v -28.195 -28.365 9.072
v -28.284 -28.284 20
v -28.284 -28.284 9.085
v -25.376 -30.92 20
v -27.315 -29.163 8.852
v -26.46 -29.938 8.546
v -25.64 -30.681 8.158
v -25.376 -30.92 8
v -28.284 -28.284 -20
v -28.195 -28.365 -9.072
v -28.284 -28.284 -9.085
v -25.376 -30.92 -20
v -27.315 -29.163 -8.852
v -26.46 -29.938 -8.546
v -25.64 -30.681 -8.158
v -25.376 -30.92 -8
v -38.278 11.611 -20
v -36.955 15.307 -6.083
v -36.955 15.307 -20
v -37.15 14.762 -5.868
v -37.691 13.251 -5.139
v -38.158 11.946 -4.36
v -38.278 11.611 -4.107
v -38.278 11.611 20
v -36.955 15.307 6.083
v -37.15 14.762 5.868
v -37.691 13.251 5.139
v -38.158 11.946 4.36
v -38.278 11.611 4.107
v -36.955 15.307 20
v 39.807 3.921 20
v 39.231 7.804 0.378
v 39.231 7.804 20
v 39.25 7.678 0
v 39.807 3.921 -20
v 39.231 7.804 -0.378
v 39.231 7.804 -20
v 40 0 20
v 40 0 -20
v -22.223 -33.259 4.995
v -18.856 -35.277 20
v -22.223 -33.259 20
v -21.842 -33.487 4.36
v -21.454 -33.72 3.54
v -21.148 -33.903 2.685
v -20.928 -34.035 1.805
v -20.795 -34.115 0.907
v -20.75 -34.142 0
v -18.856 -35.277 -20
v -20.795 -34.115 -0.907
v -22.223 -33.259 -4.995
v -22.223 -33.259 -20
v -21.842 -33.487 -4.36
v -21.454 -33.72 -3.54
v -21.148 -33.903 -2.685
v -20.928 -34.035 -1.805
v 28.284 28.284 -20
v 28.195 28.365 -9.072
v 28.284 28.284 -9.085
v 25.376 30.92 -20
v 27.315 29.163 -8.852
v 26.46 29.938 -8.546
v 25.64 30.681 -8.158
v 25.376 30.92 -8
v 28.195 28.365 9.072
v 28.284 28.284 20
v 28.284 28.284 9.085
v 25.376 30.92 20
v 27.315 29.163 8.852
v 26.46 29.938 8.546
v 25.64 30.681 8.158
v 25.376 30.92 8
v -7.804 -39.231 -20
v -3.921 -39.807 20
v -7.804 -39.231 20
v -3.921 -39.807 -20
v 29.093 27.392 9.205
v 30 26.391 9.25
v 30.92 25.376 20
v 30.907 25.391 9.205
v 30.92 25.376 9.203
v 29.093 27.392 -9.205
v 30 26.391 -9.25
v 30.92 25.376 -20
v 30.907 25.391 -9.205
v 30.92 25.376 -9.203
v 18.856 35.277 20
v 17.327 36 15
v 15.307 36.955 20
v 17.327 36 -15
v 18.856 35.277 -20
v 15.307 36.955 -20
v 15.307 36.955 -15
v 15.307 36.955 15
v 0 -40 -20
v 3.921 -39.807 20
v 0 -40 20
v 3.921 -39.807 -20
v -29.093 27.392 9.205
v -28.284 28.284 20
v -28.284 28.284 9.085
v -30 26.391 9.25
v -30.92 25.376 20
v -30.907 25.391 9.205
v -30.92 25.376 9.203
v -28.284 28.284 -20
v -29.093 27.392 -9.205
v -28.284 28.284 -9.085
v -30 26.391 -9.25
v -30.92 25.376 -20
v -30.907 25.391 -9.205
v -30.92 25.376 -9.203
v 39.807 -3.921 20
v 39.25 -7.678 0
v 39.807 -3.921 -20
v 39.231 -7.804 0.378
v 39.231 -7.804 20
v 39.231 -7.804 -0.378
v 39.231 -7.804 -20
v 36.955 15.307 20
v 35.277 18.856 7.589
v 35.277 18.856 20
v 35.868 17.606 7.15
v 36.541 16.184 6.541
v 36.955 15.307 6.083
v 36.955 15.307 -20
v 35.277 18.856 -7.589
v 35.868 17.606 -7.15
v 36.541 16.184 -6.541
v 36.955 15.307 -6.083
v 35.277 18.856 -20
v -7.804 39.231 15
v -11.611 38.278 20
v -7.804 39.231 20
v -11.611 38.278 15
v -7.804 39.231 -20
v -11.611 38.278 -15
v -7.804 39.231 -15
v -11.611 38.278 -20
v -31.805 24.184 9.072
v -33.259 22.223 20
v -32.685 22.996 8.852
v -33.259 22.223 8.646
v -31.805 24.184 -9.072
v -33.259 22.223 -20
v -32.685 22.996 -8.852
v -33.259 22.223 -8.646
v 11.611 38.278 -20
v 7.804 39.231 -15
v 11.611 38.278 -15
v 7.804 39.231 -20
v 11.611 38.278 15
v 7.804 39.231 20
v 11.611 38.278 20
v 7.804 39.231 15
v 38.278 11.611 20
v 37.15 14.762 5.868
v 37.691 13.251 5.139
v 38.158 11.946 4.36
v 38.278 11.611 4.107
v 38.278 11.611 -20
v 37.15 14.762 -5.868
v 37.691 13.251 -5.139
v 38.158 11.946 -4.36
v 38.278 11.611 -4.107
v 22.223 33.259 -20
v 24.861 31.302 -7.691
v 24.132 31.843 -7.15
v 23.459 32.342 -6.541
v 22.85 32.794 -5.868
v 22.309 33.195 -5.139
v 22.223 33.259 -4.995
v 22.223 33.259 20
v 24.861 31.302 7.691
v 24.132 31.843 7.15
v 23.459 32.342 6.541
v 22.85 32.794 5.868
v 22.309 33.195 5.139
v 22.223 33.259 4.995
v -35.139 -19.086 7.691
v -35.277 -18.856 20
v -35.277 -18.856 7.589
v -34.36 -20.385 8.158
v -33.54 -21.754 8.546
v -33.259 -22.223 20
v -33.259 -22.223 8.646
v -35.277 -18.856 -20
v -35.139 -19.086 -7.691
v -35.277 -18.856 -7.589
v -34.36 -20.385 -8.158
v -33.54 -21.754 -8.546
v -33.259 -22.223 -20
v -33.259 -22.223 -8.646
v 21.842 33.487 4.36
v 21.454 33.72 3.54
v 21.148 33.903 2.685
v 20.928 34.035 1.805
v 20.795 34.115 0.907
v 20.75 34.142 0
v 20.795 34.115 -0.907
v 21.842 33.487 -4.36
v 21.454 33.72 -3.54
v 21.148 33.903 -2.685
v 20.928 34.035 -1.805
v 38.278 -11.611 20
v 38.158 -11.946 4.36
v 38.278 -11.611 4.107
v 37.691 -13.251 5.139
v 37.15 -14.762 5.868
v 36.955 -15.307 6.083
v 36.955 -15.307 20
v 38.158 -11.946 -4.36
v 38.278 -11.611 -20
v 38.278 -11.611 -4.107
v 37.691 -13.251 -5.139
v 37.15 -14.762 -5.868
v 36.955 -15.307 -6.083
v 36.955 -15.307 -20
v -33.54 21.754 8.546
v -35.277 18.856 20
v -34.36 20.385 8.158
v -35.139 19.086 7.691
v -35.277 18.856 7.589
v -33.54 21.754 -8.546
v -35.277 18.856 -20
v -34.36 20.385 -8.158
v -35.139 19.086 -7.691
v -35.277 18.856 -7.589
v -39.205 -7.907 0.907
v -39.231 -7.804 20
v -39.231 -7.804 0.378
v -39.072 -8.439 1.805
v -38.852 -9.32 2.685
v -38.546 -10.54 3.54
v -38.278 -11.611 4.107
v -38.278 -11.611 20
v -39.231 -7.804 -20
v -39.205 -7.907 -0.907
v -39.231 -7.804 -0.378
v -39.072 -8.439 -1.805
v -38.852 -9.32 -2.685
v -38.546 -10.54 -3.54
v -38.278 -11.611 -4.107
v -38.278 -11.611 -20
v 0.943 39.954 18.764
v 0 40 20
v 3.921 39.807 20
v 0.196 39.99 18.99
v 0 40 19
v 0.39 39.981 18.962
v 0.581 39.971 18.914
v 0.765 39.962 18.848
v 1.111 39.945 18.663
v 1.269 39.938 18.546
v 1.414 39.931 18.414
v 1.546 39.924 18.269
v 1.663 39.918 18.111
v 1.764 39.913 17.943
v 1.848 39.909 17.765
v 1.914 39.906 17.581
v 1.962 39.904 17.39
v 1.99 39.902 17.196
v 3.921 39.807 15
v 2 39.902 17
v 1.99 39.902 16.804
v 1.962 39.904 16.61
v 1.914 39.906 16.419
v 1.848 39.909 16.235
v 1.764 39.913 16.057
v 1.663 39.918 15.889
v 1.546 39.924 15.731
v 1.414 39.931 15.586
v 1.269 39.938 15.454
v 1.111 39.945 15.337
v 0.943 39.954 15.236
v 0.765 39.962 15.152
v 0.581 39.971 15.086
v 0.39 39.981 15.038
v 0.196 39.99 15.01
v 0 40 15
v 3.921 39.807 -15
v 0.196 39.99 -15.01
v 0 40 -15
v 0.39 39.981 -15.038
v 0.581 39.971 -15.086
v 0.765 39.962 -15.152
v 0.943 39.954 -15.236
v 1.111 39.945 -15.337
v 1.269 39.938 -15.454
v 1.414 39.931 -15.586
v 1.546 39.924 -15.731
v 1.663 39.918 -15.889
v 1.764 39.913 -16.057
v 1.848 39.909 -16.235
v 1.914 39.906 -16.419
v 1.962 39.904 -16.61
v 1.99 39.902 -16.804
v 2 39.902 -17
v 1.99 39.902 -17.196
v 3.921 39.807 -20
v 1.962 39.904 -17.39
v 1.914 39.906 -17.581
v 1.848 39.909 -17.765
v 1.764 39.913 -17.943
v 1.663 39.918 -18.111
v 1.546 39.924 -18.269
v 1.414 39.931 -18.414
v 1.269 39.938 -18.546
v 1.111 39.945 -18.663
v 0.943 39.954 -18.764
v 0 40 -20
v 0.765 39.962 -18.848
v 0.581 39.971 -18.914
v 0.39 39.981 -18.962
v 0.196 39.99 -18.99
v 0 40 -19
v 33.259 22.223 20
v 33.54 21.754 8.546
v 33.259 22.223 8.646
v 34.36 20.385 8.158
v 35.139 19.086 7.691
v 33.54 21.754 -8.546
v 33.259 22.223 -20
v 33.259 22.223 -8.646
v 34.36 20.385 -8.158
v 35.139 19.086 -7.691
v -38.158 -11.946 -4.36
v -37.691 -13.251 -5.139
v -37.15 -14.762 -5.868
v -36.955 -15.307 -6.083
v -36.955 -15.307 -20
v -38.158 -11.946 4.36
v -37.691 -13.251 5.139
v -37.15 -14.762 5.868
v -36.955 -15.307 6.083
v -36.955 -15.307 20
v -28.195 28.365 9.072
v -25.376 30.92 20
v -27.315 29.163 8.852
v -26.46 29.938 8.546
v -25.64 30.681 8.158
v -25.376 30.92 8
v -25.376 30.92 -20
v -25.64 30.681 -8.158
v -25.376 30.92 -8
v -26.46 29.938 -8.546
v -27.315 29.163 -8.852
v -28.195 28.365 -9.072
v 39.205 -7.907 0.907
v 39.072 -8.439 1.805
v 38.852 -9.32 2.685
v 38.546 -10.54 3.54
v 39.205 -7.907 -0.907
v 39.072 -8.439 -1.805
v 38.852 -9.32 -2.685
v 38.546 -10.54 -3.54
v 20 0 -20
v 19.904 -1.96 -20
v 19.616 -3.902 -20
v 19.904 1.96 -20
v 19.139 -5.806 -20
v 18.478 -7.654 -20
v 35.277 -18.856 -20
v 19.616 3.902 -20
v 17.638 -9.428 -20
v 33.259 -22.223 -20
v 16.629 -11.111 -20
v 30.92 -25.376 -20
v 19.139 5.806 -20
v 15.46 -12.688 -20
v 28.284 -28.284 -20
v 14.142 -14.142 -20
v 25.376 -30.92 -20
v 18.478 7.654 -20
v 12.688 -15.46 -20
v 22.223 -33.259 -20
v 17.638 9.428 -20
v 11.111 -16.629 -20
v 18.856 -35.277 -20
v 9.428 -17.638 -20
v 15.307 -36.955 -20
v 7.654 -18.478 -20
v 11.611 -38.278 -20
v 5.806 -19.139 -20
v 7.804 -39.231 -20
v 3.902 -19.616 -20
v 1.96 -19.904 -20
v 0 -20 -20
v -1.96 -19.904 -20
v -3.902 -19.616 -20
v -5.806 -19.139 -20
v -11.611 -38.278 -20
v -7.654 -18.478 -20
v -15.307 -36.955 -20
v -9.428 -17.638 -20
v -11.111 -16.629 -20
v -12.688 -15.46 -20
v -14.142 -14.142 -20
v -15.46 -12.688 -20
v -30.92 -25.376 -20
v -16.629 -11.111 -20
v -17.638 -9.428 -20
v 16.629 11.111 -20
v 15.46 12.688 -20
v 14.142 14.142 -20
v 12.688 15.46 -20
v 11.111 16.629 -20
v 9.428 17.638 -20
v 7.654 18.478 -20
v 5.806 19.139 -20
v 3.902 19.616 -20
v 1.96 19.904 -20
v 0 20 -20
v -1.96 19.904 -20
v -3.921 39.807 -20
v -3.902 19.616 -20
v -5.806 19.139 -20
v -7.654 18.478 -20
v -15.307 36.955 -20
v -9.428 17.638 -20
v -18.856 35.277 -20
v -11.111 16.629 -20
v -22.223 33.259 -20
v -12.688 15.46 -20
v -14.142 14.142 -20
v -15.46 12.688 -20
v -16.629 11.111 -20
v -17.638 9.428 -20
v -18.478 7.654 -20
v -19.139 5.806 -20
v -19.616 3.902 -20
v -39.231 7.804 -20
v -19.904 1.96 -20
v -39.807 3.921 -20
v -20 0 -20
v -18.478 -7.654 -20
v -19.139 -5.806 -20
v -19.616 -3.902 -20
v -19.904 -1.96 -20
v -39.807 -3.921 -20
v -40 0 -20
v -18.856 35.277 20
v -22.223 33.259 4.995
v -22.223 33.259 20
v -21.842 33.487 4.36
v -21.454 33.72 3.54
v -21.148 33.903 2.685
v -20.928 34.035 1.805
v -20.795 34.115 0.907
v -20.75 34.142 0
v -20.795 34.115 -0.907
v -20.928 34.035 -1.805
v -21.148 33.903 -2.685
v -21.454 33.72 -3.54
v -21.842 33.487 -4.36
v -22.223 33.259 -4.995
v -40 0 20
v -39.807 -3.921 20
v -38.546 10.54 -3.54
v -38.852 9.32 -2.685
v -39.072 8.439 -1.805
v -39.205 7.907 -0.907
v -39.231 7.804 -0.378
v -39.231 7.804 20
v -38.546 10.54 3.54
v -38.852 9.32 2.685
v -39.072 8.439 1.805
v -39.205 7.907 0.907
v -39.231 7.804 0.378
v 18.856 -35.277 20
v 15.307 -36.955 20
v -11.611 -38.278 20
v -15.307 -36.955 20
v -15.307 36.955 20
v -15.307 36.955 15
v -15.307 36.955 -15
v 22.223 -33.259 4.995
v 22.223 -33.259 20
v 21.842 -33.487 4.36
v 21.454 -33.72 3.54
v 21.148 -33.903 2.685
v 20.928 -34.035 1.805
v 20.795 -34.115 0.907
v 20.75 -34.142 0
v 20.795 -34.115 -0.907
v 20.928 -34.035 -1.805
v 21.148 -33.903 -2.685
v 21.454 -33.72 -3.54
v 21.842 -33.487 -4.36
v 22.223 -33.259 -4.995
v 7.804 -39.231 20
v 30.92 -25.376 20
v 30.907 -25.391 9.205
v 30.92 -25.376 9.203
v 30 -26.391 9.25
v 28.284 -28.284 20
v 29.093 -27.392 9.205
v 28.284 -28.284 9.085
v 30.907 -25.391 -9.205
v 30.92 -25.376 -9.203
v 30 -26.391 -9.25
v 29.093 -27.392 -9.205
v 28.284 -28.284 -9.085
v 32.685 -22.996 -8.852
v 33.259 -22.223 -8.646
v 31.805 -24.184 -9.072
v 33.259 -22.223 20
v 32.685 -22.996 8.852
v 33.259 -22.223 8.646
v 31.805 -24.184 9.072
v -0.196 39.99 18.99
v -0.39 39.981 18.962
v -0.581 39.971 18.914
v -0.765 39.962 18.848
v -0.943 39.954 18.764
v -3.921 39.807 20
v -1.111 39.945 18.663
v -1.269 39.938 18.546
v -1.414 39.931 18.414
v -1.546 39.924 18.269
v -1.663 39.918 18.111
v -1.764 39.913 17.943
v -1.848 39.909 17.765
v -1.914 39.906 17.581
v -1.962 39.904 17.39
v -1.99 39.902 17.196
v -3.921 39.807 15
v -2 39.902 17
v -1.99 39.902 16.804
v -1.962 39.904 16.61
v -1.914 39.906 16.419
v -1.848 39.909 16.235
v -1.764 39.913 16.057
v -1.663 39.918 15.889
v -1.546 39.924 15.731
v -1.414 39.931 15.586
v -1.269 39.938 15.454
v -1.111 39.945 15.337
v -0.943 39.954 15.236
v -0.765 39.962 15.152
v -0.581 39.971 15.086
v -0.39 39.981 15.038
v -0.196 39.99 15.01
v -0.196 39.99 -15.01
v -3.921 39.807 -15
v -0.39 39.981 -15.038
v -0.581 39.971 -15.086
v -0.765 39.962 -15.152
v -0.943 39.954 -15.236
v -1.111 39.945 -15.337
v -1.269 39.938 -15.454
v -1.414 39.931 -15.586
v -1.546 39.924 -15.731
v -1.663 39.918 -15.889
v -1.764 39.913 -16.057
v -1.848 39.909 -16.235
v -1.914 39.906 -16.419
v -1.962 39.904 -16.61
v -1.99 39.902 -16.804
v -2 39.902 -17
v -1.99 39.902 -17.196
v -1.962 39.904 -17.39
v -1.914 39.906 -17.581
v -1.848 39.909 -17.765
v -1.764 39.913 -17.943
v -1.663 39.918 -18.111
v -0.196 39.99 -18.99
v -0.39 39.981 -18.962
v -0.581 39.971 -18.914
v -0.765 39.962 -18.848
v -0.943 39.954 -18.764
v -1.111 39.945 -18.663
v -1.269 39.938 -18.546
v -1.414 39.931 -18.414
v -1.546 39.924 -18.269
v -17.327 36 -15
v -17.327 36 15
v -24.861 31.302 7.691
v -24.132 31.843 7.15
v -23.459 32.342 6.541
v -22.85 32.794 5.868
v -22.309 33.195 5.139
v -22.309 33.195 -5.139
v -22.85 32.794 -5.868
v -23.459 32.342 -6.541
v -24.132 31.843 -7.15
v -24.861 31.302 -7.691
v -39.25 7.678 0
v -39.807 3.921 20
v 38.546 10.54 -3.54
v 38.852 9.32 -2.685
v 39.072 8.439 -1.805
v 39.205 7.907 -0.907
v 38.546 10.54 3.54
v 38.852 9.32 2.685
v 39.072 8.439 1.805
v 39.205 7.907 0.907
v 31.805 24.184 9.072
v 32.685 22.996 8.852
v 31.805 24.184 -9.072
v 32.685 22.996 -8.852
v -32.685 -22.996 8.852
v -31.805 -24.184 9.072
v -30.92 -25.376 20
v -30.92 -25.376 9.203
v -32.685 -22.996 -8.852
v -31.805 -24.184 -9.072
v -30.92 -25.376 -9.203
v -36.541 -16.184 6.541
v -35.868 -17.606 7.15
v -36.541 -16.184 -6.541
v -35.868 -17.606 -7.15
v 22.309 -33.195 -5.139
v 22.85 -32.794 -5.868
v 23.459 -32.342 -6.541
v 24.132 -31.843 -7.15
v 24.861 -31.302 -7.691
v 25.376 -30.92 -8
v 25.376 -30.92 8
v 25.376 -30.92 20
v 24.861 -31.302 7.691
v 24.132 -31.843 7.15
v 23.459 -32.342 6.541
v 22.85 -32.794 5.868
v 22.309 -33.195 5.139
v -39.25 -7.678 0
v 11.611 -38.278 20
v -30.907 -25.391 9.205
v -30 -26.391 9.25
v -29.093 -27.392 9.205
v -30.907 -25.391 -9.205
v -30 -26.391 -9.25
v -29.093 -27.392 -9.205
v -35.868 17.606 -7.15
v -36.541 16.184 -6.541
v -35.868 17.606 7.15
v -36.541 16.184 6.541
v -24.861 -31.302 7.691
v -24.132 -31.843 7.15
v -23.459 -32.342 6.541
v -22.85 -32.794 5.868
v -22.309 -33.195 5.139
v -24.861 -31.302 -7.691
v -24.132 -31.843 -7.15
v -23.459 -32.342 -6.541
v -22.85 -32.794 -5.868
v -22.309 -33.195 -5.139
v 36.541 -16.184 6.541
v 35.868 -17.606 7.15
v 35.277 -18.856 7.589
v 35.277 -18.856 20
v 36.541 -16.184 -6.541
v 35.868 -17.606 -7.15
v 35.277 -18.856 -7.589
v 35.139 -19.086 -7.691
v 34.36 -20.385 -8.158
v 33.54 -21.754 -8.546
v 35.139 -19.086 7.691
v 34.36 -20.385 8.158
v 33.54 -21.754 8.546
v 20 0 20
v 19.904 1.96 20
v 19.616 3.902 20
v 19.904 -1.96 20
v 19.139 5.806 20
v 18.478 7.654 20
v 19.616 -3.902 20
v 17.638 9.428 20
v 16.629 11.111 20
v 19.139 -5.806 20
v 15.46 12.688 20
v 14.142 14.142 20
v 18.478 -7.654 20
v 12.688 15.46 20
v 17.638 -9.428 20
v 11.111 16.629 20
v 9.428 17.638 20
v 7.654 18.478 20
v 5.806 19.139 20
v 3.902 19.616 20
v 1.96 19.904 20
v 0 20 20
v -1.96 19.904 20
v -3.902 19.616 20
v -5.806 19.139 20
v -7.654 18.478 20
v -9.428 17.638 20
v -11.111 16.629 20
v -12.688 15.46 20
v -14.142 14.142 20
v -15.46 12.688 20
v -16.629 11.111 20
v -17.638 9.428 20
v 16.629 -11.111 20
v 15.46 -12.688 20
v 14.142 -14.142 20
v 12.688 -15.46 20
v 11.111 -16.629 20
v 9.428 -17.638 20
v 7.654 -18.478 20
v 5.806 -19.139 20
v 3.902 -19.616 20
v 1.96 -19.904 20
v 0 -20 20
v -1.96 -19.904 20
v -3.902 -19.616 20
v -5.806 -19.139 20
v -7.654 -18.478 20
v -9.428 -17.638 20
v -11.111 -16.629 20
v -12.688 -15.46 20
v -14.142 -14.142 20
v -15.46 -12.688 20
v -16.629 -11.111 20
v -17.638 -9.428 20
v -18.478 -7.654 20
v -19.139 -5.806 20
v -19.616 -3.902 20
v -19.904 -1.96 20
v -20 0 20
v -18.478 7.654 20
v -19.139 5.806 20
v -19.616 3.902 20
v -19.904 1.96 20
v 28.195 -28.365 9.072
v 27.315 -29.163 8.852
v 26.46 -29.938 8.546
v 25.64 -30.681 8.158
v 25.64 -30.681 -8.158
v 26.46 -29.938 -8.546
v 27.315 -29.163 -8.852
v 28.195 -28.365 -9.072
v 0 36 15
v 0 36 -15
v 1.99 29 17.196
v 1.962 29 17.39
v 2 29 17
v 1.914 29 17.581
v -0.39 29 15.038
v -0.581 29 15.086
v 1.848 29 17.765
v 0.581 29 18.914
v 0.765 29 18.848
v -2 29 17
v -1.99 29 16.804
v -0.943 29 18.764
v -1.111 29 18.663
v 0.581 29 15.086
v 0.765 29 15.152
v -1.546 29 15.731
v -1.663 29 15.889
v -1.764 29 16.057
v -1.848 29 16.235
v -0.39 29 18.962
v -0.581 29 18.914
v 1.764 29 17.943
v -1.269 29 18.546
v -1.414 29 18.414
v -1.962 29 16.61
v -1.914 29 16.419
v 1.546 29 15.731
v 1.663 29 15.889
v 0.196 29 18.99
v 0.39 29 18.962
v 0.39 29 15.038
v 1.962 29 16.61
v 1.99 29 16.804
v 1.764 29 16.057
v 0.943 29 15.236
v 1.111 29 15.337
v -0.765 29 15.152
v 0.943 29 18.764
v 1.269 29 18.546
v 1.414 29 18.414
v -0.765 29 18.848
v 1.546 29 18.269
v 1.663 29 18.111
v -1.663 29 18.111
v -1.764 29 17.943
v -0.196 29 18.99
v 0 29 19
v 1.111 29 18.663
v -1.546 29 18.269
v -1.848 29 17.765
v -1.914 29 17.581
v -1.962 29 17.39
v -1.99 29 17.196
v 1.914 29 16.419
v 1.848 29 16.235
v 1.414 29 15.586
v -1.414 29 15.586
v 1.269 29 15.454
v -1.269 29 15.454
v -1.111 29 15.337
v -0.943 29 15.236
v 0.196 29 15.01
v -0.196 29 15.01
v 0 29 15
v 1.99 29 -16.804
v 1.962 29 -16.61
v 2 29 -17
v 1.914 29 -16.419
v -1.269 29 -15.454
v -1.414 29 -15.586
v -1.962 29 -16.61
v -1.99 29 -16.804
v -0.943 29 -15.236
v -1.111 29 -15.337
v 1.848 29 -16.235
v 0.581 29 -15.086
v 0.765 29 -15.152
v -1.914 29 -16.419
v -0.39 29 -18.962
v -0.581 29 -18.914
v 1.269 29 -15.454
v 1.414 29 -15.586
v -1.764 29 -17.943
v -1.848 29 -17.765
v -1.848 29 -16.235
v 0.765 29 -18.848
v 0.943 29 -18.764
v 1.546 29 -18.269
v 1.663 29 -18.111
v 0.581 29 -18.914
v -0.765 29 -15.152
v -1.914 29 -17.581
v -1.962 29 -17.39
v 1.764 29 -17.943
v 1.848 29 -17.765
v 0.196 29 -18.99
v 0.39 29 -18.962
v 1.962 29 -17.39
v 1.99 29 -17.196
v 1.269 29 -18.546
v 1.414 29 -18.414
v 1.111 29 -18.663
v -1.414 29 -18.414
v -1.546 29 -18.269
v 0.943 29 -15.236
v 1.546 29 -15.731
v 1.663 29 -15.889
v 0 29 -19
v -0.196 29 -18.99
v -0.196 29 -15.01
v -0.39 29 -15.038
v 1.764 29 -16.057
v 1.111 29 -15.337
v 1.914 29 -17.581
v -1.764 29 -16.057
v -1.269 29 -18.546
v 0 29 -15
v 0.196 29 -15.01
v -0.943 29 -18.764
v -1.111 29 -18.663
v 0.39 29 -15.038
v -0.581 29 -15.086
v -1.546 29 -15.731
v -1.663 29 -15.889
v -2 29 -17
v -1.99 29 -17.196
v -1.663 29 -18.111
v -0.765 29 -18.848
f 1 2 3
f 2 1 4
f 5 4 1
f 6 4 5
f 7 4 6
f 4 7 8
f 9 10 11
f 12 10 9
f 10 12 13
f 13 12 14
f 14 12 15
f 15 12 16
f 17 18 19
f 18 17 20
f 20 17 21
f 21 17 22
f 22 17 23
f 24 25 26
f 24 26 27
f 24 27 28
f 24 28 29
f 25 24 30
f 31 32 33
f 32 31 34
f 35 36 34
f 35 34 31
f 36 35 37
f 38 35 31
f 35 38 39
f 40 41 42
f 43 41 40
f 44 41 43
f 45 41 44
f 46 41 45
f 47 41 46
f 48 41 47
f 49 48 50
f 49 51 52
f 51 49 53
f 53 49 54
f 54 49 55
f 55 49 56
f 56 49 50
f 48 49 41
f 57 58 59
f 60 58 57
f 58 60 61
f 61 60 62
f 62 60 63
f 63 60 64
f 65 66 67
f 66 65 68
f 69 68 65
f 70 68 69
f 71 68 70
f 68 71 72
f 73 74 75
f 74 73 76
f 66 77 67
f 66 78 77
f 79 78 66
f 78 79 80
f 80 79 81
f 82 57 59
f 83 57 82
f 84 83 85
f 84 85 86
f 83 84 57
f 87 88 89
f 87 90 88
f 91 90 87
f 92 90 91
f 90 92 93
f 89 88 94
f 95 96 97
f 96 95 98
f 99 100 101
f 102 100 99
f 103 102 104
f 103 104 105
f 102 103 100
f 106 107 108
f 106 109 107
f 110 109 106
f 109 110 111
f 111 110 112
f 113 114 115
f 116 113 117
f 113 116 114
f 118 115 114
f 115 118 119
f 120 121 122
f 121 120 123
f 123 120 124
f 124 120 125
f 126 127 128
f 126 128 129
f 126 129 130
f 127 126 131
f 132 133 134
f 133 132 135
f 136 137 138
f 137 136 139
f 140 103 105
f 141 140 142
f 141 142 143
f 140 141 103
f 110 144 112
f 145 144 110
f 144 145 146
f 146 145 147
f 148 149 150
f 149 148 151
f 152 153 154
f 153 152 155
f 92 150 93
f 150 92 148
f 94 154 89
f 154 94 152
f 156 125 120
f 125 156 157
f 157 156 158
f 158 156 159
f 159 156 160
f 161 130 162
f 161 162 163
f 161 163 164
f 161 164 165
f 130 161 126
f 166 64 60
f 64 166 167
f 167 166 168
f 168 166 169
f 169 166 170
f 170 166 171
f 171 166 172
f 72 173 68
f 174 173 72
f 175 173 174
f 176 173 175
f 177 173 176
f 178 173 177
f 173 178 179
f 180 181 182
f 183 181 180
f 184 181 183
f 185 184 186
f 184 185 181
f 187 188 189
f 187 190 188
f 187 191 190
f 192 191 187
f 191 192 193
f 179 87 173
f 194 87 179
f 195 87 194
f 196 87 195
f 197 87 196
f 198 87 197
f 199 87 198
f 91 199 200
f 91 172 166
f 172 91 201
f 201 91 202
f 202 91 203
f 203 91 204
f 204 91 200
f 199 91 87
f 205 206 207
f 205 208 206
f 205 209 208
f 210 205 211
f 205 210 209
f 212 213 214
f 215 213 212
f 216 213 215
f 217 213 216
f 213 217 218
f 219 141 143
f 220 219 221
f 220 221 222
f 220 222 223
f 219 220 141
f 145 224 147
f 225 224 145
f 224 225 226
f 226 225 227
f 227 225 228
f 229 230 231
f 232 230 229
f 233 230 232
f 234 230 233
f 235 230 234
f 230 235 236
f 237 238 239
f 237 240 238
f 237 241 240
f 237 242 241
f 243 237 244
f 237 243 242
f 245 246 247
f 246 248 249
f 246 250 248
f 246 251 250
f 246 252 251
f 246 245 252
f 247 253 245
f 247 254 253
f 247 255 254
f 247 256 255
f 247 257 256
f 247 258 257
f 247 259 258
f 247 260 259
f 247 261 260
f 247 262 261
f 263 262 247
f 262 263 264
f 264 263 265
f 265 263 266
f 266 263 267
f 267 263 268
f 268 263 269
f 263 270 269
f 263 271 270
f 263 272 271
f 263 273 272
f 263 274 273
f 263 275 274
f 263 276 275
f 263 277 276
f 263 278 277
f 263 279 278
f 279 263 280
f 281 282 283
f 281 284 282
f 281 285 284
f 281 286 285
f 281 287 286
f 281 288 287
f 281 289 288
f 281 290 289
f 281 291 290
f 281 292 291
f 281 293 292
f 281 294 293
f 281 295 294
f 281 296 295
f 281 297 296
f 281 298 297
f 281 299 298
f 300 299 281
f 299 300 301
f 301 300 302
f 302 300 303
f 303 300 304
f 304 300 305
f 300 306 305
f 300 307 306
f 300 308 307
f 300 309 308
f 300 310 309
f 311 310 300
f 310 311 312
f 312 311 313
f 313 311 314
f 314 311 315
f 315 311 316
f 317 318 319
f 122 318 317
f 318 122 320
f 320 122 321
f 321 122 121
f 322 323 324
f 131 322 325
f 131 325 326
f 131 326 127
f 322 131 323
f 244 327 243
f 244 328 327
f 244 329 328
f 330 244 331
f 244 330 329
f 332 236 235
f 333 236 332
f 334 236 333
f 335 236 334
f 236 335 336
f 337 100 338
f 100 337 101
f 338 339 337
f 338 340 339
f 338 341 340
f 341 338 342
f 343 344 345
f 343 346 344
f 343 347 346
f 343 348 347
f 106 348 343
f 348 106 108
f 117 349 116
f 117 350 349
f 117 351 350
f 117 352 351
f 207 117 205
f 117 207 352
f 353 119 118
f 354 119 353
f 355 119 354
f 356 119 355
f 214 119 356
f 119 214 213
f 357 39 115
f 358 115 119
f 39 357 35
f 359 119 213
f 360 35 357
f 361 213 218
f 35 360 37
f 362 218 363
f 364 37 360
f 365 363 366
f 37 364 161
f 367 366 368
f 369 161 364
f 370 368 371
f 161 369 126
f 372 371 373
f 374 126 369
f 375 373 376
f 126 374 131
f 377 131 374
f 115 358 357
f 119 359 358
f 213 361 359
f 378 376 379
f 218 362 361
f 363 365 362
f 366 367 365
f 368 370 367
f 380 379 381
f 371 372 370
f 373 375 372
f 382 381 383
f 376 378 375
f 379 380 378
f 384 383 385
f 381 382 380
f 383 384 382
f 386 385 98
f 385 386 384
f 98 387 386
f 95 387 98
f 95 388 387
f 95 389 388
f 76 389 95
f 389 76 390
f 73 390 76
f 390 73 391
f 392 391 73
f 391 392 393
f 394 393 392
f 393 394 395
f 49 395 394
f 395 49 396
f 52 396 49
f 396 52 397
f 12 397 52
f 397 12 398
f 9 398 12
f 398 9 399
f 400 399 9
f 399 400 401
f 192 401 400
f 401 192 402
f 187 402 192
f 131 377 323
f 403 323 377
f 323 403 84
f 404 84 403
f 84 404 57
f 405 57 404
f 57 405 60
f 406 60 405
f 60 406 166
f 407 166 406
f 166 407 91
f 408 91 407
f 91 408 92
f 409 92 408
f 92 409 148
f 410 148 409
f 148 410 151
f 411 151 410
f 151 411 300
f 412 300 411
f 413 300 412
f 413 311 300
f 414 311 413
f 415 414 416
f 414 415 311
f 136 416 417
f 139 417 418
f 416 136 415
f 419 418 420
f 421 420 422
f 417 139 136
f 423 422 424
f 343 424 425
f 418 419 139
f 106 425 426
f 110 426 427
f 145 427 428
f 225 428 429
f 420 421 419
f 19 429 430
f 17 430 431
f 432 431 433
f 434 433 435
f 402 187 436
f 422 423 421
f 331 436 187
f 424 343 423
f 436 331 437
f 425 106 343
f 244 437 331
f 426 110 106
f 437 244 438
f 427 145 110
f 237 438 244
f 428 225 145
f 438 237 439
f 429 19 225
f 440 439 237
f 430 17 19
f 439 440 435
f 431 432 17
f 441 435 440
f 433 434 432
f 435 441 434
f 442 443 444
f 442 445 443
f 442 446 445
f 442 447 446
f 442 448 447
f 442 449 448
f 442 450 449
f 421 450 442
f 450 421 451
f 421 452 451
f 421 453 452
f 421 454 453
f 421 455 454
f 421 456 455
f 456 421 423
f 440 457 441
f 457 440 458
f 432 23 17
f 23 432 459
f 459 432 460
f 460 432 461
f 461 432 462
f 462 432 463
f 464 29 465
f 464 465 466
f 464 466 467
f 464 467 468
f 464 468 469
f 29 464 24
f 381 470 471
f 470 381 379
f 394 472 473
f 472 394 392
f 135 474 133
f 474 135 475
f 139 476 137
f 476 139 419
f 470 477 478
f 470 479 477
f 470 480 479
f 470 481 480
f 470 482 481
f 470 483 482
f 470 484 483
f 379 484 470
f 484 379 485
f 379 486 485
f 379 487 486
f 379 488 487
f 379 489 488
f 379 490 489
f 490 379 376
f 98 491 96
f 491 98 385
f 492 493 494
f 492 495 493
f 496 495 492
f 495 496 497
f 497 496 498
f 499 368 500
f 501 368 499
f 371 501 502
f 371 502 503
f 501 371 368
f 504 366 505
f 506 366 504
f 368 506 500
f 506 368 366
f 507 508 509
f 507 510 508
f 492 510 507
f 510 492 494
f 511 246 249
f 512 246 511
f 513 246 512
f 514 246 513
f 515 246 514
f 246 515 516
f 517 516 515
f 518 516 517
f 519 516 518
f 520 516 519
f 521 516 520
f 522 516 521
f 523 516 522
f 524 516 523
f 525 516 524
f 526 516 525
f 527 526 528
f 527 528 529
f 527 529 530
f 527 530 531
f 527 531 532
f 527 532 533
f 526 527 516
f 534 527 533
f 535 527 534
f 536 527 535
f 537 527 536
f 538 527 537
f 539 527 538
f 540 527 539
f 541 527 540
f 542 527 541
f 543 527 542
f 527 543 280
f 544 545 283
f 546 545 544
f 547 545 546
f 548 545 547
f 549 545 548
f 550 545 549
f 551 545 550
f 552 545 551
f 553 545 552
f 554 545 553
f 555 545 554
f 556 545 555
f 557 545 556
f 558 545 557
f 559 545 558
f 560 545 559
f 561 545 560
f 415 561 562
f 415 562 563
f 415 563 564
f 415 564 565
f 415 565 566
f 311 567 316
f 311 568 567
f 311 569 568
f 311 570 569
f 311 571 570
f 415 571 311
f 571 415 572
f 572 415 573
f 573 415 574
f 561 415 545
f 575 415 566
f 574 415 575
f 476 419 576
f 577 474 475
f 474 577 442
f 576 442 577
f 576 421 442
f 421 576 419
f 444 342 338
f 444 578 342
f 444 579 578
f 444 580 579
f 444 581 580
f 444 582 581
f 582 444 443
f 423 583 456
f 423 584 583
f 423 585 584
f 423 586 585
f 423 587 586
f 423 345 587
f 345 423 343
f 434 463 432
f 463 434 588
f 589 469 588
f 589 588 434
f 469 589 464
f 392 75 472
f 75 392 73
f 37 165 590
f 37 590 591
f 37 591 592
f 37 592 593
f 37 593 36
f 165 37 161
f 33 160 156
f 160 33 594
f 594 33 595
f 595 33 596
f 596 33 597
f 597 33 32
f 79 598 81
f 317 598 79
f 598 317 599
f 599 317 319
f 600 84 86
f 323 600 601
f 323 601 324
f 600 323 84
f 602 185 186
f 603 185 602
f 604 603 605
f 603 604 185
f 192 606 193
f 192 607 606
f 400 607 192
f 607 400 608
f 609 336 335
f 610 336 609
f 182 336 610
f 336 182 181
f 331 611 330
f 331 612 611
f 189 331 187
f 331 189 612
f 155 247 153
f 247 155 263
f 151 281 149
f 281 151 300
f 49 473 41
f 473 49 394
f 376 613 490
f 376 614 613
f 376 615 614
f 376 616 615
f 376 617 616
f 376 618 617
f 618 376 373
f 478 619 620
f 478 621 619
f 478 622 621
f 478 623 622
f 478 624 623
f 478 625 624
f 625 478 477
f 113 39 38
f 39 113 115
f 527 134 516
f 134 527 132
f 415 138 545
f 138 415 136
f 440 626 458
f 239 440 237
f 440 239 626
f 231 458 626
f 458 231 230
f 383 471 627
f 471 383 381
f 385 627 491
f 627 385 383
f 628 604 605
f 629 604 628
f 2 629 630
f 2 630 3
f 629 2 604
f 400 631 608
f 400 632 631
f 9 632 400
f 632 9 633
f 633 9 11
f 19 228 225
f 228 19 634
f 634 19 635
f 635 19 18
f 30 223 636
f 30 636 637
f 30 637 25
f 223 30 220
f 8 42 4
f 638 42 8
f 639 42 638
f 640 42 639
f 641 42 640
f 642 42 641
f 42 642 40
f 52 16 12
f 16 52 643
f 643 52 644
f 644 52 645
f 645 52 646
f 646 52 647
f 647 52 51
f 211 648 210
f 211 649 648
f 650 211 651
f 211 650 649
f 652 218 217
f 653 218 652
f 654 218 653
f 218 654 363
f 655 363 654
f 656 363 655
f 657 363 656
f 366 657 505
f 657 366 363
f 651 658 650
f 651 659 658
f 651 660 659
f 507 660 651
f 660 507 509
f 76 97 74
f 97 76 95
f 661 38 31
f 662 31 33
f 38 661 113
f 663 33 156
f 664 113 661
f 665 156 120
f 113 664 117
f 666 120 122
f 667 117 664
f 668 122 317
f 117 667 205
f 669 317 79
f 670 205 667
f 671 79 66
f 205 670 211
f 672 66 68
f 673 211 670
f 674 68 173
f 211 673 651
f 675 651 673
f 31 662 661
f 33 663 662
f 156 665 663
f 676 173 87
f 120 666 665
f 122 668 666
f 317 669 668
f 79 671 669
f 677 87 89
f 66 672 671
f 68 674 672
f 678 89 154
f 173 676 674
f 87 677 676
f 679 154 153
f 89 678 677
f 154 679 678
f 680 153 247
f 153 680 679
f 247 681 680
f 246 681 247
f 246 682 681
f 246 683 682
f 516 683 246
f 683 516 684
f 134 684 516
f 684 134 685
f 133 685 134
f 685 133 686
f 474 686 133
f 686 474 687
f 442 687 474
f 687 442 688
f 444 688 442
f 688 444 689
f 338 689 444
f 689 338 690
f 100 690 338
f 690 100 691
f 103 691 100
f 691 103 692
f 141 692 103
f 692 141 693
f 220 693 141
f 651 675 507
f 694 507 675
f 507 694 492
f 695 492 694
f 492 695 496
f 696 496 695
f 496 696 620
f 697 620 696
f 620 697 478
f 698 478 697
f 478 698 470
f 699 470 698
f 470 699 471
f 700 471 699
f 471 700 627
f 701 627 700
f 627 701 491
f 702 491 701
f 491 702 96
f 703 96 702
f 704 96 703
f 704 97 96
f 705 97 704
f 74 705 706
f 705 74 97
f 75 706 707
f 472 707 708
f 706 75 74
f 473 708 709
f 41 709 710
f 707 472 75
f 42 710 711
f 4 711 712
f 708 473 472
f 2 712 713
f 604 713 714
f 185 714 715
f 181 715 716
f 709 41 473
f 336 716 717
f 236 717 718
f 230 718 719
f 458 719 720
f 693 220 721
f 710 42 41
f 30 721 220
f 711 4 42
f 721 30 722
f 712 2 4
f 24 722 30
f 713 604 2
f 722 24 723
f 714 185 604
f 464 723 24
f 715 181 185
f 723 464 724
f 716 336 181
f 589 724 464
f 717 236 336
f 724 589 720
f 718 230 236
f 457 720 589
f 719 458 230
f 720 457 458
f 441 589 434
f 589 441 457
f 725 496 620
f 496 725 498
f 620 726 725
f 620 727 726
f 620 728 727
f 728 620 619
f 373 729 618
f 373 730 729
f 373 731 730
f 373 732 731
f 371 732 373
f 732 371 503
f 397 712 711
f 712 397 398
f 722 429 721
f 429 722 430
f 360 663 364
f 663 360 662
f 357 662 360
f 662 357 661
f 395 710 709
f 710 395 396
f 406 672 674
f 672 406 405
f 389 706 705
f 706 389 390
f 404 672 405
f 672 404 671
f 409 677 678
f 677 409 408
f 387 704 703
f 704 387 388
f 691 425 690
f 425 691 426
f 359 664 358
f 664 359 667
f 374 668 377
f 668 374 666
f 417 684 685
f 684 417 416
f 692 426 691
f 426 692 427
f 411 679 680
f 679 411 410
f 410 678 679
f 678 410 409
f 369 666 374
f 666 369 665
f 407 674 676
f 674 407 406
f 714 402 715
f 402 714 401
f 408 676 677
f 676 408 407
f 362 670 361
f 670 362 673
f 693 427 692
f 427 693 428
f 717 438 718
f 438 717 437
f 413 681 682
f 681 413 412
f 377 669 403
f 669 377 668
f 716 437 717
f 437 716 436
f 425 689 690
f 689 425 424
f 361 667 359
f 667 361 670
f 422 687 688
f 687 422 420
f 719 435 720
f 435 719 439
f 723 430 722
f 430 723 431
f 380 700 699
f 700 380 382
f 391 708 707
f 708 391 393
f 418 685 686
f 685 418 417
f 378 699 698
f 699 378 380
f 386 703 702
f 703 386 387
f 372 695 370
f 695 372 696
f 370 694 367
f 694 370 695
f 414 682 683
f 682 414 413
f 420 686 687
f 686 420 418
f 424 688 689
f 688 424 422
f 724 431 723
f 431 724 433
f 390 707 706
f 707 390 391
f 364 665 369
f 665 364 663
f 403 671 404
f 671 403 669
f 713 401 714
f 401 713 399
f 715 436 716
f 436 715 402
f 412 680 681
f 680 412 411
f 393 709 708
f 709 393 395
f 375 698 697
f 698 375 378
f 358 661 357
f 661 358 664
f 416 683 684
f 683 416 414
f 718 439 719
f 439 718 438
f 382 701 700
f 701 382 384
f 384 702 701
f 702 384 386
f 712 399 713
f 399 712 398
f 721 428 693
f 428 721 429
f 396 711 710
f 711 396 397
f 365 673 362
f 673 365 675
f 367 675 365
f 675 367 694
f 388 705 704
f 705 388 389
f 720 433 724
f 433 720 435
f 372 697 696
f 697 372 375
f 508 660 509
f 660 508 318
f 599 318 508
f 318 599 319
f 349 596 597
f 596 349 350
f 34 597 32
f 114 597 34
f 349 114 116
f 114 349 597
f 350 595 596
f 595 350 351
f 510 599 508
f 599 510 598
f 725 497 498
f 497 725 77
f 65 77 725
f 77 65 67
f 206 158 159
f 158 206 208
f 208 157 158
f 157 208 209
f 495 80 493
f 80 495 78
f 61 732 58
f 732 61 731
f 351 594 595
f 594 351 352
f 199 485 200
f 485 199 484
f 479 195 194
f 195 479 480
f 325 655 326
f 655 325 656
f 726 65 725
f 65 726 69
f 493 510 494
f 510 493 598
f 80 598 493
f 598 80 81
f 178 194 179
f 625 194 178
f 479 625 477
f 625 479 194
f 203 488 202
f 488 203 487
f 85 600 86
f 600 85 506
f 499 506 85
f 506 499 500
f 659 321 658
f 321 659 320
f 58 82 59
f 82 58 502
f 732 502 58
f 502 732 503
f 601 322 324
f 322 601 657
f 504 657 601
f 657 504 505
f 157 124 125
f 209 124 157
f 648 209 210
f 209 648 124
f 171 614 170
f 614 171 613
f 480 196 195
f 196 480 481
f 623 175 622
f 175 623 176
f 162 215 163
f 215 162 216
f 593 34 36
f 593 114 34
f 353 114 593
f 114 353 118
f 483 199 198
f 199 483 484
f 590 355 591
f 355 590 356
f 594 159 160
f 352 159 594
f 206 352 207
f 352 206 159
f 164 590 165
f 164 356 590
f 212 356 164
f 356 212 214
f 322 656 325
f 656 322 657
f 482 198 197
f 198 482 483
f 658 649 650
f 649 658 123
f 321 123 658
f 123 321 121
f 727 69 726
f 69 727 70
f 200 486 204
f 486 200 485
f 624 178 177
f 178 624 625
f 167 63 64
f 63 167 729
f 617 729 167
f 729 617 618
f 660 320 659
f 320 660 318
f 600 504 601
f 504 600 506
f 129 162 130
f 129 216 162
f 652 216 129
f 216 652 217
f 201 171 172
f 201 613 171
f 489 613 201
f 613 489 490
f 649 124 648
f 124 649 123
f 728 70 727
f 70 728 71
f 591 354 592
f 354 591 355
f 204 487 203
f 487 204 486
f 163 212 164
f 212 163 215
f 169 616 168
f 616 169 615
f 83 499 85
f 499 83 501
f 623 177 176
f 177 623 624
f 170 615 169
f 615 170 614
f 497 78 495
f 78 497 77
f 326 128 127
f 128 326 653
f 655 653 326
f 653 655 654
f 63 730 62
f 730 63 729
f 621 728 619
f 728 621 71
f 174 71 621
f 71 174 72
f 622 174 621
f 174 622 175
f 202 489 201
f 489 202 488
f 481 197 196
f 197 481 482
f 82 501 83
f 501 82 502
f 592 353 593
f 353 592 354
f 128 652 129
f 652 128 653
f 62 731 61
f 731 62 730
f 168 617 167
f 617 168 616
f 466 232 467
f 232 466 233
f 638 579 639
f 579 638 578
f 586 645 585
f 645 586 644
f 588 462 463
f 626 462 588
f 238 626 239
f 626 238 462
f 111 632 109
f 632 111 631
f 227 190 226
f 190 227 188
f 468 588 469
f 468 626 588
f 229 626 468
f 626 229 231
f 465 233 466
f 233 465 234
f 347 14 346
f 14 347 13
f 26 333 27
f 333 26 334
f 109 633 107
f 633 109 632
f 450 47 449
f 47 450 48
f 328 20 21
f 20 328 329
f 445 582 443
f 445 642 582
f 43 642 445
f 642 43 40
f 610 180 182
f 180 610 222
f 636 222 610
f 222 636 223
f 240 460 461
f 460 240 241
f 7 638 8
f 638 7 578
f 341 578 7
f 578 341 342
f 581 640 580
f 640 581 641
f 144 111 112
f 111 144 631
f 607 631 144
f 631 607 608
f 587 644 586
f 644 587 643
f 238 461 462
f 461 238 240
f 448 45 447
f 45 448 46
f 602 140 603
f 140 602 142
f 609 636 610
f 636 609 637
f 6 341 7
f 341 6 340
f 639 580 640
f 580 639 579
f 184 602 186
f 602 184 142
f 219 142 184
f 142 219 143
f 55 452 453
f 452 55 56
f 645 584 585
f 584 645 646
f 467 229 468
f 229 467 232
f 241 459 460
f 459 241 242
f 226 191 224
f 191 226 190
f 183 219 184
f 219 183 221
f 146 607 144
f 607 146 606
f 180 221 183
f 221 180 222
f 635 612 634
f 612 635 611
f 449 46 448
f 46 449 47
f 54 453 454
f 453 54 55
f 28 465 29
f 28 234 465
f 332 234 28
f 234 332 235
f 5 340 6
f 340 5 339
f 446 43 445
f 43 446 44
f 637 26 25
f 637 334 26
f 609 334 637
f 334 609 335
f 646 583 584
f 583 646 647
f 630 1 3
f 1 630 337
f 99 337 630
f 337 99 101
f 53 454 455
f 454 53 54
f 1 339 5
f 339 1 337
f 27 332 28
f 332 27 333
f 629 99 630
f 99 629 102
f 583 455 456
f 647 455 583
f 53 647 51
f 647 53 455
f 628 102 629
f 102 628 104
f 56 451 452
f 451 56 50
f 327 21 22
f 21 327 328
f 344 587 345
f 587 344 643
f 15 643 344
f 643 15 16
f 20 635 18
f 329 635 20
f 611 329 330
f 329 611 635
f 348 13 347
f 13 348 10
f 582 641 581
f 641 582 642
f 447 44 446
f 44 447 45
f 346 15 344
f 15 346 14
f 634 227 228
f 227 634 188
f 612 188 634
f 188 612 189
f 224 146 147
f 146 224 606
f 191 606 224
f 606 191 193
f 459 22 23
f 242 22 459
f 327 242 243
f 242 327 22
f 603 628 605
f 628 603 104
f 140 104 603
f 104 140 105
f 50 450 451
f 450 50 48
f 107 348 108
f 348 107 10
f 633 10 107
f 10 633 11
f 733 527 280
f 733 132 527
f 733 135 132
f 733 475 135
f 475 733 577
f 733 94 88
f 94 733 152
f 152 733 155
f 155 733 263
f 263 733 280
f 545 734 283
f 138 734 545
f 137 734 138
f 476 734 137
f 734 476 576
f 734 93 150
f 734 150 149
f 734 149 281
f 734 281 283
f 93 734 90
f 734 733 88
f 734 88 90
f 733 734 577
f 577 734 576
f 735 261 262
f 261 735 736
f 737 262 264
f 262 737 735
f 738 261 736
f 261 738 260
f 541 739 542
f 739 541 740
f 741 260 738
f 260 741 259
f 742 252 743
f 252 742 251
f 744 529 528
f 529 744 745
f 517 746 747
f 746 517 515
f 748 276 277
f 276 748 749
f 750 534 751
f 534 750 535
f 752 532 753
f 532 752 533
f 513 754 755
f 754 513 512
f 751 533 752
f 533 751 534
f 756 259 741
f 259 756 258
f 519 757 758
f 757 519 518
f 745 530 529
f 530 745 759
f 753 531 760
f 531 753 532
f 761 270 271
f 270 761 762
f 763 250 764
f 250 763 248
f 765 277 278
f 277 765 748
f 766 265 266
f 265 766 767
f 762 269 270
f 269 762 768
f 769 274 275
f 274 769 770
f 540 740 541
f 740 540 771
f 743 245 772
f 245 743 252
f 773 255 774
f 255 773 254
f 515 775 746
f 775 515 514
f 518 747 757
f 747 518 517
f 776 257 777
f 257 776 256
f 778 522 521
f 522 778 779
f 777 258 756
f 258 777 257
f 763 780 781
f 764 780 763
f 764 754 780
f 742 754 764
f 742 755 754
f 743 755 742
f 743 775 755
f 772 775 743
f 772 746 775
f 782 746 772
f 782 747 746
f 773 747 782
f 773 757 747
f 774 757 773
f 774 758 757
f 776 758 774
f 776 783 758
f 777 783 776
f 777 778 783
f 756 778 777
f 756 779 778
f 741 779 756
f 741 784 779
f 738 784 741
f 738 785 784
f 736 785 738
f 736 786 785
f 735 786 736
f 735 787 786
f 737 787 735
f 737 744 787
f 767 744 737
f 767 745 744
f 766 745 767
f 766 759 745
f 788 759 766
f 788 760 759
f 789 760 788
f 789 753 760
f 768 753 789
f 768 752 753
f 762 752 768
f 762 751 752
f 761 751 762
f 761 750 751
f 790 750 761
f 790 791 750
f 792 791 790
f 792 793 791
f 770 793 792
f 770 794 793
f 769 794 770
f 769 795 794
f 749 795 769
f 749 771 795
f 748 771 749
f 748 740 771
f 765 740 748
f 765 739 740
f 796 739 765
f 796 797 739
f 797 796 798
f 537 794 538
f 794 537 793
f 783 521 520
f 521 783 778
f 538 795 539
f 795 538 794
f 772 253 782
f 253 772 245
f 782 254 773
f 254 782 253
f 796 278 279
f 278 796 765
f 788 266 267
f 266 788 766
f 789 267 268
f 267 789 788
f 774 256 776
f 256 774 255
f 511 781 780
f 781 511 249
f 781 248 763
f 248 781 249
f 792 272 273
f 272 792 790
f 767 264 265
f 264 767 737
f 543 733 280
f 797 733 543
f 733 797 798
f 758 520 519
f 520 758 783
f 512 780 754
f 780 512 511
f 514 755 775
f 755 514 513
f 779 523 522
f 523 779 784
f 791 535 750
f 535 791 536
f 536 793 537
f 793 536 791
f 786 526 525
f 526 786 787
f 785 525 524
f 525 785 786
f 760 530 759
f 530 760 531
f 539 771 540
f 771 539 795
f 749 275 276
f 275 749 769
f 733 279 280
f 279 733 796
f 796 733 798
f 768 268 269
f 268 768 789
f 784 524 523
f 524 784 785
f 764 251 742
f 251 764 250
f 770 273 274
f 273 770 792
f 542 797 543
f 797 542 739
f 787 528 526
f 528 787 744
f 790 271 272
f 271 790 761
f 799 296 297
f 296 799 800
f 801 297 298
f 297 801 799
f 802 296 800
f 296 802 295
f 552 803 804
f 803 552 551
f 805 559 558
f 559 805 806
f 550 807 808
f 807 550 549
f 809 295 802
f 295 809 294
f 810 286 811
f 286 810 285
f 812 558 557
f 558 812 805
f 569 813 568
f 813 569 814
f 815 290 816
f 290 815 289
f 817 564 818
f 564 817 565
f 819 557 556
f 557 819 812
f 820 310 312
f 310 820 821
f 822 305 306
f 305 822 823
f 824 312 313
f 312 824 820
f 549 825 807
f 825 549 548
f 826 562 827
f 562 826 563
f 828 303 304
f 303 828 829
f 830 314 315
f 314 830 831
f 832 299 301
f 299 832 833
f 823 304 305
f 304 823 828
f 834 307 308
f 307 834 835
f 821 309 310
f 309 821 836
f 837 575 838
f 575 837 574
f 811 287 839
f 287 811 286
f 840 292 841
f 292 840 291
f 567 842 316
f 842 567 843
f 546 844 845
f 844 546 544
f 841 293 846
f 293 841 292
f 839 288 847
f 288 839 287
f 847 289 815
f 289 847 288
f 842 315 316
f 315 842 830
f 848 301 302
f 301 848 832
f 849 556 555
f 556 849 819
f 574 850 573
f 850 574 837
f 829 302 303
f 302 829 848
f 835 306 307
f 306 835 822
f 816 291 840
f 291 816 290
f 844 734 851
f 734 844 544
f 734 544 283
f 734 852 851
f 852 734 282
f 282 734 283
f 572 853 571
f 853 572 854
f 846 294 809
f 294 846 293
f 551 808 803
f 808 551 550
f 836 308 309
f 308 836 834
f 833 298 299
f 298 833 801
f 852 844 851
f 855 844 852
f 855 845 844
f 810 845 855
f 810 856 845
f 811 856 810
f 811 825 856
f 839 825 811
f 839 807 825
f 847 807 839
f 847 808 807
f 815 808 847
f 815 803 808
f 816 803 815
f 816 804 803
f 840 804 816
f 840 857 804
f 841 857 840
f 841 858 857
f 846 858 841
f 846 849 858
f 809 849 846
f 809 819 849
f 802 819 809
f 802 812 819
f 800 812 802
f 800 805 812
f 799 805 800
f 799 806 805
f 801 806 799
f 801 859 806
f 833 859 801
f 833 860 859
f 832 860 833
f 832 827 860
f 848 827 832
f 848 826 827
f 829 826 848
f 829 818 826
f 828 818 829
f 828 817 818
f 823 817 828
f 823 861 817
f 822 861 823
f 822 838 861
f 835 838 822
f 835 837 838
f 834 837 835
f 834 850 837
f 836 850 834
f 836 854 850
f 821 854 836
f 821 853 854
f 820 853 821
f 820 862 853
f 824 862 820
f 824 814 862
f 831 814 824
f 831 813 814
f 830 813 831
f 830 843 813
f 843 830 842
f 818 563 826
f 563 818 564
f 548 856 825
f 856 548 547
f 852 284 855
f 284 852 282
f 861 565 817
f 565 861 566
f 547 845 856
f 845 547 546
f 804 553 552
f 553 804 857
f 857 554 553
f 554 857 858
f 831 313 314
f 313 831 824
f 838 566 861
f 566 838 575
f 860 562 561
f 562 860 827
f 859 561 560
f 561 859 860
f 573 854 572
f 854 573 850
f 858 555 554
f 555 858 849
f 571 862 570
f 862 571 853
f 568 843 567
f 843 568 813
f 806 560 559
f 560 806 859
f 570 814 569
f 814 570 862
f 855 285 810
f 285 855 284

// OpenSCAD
// COBRA Vertebra - T5 V11
// Height: 40.0mm, OD: 80.0mm

$fn = 64;

difference() {
    // Outer cylinder
    cylinder(h=40.0, d=80.0, center=true);
    
    // Inner channel
    cylinder(h=42.0, d=40.0, center=true);

    // Battery cavity 1
    rotate([0, 0, 0])
    translate([30.0, 0, 0])
    rotate([90, 0, 0])
    cylinder(h=74.0, d=18.5, center=true);

    // Battery cavity 2
    rotate([0, 0, 180])
    translate([30.0, 0, 0])
    rotate([90, 0, 0])
    cylinder(h=74.0, d=18.5, center=true);

    // Solar panel cavity
    translate([0, 38.0, 0])
    cube([50, 4, 30], center=true);

    // Pivot holes
    translate([0, 40.0, 17.0])
    rotate([90, 0, 0])
    cylinder(h=22.0, d=4, center=true);
    
    translate([0, 40.0, -17.0])
    rotate([90, 0, 0])
    cylinder(h=22.0, d=4, center=true);
}
